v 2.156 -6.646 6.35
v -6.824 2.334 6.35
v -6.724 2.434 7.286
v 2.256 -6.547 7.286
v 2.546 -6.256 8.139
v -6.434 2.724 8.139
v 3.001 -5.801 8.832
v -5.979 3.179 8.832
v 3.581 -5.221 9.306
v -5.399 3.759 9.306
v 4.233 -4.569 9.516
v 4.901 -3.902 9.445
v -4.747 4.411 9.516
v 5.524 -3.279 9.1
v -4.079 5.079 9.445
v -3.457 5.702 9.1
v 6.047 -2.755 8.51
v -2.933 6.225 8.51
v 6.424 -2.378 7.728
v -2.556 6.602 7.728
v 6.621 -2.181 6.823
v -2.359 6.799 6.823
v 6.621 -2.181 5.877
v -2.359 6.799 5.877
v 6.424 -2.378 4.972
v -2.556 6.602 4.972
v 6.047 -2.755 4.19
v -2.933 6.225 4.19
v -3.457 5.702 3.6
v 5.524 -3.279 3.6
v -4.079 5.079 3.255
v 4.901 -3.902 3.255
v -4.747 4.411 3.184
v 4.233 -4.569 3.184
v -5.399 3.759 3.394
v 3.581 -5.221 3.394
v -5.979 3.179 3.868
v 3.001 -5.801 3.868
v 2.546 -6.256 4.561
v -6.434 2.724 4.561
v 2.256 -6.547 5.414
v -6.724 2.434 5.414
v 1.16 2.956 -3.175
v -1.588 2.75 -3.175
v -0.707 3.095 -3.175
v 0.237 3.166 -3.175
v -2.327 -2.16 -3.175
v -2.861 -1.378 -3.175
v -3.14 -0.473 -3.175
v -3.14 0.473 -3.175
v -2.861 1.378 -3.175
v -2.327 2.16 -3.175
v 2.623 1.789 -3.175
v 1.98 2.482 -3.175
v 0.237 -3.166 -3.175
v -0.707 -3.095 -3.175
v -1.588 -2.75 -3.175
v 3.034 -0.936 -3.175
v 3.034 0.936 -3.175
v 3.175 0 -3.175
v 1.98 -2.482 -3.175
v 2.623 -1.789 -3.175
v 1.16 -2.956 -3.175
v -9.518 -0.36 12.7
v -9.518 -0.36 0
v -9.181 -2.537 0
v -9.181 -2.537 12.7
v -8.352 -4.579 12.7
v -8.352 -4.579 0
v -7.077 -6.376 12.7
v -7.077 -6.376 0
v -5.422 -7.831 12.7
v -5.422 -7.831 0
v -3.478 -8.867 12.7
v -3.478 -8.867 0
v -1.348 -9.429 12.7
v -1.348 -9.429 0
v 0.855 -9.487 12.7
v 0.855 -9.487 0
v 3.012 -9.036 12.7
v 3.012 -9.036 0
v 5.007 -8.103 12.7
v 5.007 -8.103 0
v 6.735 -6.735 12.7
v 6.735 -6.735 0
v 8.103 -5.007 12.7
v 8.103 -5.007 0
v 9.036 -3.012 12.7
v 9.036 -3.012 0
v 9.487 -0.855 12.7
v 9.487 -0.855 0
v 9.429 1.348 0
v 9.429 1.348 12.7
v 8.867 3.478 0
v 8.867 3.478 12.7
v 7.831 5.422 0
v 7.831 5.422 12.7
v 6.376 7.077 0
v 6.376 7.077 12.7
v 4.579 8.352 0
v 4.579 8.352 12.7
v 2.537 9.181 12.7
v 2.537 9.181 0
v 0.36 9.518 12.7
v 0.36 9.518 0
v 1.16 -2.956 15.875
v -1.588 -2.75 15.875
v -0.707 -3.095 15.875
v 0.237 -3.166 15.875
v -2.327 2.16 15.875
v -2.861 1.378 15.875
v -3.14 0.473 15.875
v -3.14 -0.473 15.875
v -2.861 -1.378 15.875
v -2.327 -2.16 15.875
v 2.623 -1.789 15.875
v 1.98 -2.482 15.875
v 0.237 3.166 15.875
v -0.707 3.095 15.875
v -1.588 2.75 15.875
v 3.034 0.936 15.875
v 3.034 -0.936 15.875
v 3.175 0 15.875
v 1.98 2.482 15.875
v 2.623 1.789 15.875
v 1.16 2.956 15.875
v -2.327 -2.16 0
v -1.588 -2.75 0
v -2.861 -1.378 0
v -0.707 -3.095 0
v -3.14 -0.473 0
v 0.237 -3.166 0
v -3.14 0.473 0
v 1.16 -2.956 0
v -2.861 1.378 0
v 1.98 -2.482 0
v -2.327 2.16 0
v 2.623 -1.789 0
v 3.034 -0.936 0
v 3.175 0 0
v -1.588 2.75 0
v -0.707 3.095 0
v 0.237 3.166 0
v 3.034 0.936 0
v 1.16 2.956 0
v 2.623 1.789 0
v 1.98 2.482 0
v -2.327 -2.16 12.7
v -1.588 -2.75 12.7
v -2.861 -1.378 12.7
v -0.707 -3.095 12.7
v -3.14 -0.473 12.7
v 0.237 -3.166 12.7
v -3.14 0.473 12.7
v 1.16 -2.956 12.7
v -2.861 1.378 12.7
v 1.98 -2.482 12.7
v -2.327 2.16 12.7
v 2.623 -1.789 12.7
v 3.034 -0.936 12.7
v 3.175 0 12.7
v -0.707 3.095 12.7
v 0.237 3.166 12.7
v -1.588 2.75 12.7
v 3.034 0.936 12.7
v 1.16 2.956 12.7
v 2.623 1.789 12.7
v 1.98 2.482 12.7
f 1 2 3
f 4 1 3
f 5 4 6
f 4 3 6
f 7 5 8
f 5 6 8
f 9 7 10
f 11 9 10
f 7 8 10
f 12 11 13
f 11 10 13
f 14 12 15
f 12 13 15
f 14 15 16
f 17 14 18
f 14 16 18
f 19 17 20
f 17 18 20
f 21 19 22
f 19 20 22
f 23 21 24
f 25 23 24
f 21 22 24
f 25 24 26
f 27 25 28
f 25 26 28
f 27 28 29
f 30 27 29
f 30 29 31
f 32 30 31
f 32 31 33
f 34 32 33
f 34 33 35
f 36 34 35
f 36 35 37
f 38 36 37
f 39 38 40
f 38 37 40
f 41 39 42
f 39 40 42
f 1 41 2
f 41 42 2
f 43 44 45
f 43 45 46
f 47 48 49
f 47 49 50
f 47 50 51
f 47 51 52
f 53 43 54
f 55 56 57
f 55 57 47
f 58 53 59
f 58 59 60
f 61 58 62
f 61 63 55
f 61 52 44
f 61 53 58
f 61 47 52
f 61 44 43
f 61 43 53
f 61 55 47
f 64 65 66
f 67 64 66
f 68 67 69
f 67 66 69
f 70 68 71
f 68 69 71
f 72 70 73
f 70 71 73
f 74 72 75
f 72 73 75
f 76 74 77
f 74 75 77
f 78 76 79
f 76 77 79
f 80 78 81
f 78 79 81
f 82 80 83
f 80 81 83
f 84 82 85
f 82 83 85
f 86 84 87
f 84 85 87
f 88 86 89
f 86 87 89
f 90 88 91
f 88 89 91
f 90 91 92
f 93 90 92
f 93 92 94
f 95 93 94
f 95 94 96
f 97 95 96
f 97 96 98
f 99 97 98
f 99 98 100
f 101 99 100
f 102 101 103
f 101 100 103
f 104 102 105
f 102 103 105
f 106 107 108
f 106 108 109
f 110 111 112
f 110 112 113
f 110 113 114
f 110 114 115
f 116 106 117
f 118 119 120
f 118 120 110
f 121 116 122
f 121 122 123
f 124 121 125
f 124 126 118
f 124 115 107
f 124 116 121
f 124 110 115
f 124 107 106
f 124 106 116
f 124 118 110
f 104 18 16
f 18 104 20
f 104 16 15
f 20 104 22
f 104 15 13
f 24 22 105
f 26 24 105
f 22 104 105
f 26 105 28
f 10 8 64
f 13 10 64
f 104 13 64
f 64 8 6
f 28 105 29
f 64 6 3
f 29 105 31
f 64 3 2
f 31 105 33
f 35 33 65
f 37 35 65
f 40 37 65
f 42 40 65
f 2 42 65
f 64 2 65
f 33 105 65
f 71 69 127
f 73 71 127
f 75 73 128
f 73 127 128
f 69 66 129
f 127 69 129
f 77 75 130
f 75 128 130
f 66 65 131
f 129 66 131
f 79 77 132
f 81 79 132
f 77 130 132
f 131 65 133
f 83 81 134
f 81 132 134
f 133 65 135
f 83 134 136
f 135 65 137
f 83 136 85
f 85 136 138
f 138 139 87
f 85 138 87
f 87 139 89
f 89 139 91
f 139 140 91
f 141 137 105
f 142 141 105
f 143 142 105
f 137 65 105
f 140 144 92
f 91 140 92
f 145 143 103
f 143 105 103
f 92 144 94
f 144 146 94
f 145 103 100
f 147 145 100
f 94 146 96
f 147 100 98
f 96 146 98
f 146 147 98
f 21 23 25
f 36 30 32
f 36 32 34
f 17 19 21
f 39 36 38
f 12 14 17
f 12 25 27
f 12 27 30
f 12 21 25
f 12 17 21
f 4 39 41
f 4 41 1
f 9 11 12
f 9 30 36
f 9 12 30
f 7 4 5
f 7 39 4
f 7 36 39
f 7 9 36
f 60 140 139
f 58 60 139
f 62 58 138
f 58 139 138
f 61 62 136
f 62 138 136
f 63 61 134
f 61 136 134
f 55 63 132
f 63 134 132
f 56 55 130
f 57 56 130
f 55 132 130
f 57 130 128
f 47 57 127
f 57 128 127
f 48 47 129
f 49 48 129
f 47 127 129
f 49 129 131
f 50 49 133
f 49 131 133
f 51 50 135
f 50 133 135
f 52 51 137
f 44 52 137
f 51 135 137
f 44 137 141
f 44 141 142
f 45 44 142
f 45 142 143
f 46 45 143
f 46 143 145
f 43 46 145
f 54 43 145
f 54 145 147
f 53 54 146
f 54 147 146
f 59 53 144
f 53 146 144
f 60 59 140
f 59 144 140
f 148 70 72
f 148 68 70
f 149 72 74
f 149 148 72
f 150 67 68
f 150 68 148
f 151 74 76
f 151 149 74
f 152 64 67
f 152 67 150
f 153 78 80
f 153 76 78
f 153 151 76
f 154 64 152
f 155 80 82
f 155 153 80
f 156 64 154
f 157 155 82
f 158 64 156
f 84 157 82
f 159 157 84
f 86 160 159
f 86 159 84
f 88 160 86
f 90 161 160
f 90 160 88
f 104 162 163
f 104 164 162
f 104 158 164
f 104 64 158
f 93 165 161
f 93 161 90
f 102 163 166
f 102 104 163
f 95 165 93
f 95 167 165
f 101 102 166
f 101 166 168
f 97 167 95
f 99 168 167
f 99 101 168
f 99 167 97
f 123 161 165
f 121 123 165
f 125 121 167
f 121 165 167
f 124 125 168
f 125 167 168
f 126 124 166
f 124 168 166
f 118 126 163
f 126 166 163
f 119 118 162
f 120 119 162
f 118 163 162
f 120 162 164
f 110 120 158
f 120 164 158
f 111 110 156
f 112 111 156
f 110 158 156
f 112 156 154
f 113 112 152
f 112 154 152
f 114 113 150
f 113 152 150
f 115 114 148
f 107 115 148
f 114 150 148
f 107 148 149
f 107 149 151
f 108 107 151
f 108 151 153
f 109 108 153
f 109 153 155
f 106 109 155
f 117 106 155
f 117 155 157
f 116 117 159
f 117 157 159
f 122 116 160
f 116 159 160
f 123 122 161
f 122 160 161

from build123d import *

# Parameters (mm, degrees)
F0_R     = 9.525
F1_DEPTH = 12.7
F2_R     = 3.175
F3_DEPTH = 3.175
F4_R     = 3.175
F5_DEPTH = 3.175
F7_DEPTH = 25.4
F8_R     = 3.175
F9_DEPTH = 12.7


with BuildPart() as f1:
    # F0 (on Top) → F1 (new body)
    with BuildSketch(Plane.XY):
        Circle(F0_R)
    extrude(amount=F1_DEPTH)

    # F2 (on face) → F3 (join)
    with BuildSketch(Plane(origin=(0, 0, 0), x_dir=(1, 0, 0), z_dir=(0, 0, -1))):
        Circle(F2_R)
    extrude(amount=F3_DEPTH)

    # F4 (on face) → F5 (join)
    with BuildSketch(Plane.XY.offset(12.7)):
        Circle(F4_R)
    extrude(amount=F5_DEPTH)

    # F6 (on face) → F7 (cut)
    with BuildSketch(Plane(origin=(0, 0, 0), x_dir=(1, 0, 0), z_dir=(0, 0, -1))):
        with BuildLine():
            Line((0.360091, -9.518191), (0, -9.1581))
            Line((0, -9.1581), (0, -9.525))
            ThreePointArc((0, -9.525), (0.180078, -9.523298), (0.360091, -9.518191))
        make_face()
        with BuildLine():
            Line((0, -9.525), (0, -9.1581))
            Line((0, -9.1581), (-4.57905, -4.57905))
            Line((-4.57905, -4.57905), (-9.1581, 0))
            Line((-9.1581, 0), (-9.525, 0))
            ThreePointArc((-9.525, 0), (-6.735192, -6.735192), (0, -9.525))
        make_face()
        with BuildLine():
            Line((-9.525, 0), (-9.1581, 0))
            Line((-9.1581, 0), (-9.518191, 0.360091))
            ThreePointArc((-9.518191, 0.360091), (-9.523298, 0.180078), (-9.525, 0))
        make_face()
    extrude(amount=-F7_DEPTH, mode=Mode.SUBTRACT)

    # F8 (on face) → F9 (cut)
    with BuildSketch(Plane(origin=(-4.57905, 4.57905, 0), x_dir=(-0.707107, -0.707107, 0), z_dir=(-0.707107, 0.707107, 0))):
        with Locations((0, 6.35)):
            Circle(F8_R)
    extrude(amount=-F9_DEPTH, mode=Mode.SUBTRACT)


solid = f1.part
